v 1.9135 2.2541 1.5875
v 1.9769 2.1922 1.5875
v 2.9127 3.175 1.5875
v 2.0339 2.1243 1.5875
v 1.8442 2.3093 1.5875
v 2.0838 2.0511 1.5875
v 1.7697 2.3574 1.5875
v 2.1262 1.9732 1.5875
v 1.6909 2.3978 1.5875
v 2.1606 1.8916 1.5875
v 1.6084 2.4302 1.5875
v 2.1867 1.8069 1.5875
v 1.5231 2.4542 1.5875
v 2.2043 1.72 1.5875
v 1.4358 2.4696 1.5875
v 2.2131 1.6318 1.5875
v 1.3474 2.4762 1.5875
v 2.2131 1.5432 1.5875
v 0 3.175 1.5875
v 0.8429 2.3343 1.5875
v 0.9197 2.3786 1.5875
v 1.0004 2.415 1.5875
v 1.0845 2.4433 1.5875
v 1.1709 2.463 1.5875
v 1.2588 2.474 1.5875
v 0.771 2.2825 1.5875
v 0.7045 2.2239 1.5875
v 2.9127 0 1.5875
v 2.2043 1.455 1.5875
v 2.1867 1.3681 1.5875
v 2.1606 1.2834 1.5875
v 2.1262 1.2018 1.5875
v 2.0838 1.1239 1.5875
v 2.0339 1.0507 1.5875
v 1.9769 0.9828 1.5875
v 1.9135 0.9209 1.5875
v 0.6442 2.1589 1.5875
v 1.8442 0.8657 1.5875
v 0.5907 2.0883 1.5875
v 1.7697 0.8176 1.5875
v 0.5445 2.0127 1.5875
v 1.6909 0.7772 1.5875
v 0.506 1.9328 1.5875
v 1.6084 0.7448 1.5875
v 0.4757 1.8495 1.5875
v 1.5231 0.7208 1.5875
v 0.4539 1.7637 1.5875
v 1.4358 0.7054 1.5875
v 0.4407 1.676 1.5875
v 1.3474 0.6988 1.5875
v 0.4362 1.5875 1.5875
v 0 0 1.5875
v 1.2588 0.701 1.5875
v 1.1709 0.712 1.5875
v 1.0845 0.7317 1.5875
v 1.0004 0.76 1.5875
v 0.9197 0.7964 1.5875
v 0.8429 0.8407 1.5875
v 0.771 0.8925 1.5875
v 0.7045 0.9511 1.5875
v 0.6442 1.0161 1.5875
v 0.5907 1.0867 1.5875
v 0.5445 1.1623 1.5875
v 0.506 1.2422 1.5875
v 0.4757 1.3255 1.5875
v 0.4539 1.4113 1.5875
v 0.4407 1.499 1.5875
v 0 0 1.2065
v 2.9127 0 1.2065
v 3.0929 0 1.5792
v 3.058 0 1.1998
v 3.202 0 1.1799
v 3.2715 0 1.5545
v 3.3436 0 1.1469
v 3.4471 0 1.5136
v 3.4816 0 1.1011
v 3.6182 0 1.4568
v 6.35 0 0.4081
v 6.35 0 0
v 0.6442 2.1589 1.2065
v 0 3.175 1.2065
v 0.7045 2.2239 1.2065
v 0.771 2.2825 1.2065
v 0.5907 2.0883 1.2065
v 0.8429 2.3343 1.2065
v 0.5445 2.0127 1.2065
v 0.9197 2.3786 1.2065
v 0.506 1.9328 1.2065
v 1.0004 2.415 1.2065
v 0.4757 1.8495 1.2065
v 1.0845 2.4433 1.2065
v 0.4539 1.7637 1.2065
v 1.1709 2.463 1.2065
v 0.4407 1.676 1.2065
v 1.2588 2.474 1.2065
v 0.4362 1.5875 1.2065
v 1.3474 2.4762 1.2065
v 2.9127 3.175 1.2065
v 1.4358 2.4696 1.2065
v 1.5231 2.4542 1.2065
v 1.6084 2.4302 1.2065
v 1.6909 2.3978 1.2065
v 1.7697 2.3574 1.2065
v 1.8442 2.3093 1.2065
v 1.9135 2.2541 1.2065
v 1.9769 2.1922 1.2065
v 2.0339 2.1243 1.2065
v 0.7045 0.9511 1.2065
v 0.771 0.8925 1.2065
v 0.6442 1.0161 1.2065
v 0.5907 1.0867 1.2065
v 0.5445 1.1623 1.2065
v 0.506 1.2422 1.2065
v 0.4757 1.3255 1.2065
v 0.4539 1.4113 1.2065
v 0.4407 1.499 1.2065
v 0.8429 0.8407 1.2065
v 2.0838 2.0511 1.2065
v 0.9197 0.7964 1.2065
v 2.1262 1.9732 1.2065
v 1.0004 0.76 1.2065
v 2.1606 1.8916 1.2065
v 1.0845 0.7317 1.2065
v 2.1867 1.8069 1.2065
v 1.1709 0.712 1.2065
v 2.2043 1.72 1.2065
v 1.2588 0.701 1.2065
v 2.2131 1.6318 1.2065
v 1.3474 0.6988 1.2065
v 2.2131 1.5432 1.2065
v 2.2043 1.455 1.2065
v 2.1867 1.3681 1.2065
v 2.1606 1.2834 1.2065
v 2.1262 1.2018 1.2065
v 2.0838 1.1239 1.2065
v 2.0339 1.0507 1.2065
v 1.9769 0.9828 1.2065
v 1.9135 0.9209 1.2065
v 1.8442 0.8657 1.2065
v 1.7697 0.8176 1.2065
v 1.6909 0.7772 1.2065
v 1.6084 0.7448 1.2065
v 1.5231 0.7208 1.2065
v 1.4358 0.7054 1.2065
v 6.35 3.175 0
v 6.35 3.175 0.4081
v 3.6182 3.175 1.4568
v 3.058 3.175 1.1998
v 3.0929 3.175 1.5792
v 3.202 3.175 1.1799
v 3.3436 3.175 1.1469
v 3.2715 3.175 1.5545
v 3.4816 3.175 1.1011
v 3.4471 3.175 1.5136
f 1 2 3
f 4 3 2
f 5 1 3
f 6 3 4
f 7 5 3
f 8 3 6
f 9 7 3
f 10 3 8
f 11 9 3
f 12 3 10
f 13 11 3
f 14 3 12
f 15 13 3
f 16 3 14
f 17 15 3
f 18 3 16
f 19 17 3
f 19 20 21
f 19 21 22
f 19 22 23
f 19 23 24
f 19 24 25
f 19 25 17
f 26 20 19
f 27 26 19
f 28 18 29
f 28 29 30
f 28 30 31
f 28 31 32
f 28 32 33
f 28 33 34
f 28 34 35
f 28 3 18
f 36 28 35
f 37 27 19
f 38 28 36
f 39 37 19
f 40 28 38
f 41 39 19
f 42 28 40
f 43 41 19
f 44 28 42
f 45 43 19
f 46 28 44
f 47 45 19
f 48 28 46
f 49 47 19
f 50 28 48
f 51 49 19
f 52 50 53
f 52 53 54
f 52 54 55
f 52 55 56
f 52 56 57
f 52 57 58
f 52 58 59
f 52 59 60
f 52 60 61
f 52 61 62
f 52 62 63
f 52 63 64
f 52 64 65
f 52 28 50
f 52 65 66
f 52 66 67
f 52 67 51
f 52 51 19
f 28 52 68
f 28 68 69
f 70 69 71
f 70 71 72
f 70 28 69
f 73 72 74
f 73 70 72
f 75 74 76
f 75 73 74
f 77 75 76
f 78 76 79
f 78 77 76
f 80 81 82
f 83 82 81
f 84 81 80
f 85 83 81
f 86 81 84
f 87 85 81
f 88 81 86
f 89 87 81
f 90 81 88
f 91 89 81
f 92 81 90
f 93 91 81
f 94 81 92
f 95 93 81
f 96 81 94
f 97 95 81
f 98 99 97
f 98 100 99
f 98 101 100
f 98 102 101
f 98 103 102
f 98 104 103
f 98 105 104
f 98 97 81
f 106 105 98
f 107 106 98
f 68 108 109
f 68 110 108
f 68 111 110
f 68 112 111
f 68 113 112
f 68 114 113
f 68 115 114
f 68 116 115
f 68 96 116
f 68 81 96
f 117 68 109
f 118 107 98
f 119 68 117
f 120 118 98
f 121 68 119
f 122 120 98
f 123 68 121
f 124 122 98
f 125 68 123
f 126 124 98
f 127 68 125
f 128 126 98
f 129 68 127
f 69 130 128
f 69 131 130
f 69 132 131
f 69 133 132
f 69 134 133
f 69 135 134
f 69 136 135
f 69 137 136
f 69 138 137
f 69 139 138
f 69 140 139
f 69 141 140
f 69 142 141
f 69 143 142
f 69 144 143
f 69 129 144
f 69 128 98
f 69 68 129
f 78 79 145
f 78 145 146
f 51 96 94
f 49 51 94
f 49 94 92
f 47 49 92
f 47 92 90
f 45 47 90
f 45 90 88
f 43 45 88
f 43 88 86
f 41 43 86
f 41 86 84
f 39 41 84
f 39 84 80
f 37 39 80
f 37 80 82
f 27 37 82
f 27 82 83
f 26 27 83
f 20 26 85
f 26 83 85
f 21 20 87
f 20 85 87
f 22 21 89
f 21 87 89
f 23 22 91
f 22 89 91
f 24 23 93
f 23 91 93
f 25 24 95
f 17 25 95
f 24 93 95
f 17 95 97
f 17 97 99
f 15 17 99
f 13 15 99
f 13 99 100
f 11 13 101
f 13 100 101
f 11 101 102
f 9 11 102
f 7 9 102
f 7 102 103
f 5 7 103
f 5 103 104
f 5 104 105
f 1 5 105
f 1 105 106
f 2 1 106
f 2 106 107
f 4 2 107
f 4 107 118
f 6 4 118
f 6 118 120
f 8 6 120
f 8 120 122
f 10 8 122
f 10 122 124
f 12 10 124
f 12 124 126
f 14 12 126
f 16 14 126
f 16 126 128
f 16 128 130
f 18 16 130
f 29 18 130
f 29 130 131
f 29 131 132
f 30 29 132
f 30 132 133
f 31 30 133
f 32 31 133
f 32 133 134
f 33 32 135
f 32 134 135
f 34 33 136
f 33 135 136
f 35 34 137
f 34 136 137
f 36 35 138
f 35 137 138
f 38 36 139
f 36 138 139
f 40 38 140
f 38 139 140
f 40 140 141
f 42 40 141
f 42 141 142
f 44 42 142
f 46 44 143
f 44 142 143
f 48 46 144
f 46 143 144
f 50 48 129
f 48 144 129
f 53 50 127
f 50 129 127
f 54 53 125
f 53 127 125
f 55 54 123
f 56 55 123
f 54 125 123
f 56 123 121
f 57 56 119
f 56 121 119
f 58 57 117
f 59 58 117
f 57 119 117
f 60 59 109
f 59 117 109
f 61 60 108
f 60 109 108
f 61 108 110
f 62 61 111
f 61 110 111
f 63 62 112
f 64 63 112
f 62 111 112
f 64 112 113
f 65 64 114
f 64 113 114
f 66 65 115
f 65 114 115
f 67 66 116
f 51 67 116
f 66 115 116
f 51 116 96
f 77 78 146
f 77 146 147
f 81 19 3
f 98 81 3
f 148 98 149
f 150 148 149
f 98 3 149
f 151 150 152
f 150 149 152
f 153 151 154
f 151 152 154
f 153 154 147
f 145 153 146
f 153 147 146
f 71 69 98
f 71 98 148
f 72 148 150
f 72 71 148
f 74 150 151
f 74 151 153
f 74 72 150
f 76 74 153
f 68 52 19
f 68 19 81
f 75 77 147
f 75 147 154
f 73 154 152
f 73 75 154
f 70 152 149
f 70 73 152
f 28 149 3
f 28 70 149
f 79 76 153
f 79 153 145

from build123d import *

# Parameters (mm, degrees)
F1_DEPTH = 3.175
F3_D     = 1.778


with BuildPart() as f1:
    # F0 (on Front) → F1 (new body)
    with BuildSketch(Plane.XZ):
        with BuildLine():
            Line((0, 1.5875), (0, 1.2065))
            Line((0, 1.2065), (2.9127343096, 1.2065))
            ThreePointArc((2.9127343096, 1.2065), (3.2020332063, 1.1799171658), (3.4816434295, 1.1010589271))
            Line((3.4816434295, 1.1010589271), (6.35, 0))
            Line((6.35, 0), (6.35, 0.4081062426))
            Line((6.35, 0.4081062426), (3.6181816183, 1.4567530696))
            ThreePointArc((3.6181816183, 1.4567530696), (3.2714649415, 1.5545372855), (2.9127343096, 1.5875))
            Line((2.9127343096, 1.5875), (0, 1.5875))
        make_face()
    extrude(amount=-F1_DEPTH)

    # F3 (through all)
    with Locations(Plane.XY.offset(1.5875)):
        with Locations((1.3252343096, 1.5875)):
            Hole(F3_D / 2)


solid = f1.part
